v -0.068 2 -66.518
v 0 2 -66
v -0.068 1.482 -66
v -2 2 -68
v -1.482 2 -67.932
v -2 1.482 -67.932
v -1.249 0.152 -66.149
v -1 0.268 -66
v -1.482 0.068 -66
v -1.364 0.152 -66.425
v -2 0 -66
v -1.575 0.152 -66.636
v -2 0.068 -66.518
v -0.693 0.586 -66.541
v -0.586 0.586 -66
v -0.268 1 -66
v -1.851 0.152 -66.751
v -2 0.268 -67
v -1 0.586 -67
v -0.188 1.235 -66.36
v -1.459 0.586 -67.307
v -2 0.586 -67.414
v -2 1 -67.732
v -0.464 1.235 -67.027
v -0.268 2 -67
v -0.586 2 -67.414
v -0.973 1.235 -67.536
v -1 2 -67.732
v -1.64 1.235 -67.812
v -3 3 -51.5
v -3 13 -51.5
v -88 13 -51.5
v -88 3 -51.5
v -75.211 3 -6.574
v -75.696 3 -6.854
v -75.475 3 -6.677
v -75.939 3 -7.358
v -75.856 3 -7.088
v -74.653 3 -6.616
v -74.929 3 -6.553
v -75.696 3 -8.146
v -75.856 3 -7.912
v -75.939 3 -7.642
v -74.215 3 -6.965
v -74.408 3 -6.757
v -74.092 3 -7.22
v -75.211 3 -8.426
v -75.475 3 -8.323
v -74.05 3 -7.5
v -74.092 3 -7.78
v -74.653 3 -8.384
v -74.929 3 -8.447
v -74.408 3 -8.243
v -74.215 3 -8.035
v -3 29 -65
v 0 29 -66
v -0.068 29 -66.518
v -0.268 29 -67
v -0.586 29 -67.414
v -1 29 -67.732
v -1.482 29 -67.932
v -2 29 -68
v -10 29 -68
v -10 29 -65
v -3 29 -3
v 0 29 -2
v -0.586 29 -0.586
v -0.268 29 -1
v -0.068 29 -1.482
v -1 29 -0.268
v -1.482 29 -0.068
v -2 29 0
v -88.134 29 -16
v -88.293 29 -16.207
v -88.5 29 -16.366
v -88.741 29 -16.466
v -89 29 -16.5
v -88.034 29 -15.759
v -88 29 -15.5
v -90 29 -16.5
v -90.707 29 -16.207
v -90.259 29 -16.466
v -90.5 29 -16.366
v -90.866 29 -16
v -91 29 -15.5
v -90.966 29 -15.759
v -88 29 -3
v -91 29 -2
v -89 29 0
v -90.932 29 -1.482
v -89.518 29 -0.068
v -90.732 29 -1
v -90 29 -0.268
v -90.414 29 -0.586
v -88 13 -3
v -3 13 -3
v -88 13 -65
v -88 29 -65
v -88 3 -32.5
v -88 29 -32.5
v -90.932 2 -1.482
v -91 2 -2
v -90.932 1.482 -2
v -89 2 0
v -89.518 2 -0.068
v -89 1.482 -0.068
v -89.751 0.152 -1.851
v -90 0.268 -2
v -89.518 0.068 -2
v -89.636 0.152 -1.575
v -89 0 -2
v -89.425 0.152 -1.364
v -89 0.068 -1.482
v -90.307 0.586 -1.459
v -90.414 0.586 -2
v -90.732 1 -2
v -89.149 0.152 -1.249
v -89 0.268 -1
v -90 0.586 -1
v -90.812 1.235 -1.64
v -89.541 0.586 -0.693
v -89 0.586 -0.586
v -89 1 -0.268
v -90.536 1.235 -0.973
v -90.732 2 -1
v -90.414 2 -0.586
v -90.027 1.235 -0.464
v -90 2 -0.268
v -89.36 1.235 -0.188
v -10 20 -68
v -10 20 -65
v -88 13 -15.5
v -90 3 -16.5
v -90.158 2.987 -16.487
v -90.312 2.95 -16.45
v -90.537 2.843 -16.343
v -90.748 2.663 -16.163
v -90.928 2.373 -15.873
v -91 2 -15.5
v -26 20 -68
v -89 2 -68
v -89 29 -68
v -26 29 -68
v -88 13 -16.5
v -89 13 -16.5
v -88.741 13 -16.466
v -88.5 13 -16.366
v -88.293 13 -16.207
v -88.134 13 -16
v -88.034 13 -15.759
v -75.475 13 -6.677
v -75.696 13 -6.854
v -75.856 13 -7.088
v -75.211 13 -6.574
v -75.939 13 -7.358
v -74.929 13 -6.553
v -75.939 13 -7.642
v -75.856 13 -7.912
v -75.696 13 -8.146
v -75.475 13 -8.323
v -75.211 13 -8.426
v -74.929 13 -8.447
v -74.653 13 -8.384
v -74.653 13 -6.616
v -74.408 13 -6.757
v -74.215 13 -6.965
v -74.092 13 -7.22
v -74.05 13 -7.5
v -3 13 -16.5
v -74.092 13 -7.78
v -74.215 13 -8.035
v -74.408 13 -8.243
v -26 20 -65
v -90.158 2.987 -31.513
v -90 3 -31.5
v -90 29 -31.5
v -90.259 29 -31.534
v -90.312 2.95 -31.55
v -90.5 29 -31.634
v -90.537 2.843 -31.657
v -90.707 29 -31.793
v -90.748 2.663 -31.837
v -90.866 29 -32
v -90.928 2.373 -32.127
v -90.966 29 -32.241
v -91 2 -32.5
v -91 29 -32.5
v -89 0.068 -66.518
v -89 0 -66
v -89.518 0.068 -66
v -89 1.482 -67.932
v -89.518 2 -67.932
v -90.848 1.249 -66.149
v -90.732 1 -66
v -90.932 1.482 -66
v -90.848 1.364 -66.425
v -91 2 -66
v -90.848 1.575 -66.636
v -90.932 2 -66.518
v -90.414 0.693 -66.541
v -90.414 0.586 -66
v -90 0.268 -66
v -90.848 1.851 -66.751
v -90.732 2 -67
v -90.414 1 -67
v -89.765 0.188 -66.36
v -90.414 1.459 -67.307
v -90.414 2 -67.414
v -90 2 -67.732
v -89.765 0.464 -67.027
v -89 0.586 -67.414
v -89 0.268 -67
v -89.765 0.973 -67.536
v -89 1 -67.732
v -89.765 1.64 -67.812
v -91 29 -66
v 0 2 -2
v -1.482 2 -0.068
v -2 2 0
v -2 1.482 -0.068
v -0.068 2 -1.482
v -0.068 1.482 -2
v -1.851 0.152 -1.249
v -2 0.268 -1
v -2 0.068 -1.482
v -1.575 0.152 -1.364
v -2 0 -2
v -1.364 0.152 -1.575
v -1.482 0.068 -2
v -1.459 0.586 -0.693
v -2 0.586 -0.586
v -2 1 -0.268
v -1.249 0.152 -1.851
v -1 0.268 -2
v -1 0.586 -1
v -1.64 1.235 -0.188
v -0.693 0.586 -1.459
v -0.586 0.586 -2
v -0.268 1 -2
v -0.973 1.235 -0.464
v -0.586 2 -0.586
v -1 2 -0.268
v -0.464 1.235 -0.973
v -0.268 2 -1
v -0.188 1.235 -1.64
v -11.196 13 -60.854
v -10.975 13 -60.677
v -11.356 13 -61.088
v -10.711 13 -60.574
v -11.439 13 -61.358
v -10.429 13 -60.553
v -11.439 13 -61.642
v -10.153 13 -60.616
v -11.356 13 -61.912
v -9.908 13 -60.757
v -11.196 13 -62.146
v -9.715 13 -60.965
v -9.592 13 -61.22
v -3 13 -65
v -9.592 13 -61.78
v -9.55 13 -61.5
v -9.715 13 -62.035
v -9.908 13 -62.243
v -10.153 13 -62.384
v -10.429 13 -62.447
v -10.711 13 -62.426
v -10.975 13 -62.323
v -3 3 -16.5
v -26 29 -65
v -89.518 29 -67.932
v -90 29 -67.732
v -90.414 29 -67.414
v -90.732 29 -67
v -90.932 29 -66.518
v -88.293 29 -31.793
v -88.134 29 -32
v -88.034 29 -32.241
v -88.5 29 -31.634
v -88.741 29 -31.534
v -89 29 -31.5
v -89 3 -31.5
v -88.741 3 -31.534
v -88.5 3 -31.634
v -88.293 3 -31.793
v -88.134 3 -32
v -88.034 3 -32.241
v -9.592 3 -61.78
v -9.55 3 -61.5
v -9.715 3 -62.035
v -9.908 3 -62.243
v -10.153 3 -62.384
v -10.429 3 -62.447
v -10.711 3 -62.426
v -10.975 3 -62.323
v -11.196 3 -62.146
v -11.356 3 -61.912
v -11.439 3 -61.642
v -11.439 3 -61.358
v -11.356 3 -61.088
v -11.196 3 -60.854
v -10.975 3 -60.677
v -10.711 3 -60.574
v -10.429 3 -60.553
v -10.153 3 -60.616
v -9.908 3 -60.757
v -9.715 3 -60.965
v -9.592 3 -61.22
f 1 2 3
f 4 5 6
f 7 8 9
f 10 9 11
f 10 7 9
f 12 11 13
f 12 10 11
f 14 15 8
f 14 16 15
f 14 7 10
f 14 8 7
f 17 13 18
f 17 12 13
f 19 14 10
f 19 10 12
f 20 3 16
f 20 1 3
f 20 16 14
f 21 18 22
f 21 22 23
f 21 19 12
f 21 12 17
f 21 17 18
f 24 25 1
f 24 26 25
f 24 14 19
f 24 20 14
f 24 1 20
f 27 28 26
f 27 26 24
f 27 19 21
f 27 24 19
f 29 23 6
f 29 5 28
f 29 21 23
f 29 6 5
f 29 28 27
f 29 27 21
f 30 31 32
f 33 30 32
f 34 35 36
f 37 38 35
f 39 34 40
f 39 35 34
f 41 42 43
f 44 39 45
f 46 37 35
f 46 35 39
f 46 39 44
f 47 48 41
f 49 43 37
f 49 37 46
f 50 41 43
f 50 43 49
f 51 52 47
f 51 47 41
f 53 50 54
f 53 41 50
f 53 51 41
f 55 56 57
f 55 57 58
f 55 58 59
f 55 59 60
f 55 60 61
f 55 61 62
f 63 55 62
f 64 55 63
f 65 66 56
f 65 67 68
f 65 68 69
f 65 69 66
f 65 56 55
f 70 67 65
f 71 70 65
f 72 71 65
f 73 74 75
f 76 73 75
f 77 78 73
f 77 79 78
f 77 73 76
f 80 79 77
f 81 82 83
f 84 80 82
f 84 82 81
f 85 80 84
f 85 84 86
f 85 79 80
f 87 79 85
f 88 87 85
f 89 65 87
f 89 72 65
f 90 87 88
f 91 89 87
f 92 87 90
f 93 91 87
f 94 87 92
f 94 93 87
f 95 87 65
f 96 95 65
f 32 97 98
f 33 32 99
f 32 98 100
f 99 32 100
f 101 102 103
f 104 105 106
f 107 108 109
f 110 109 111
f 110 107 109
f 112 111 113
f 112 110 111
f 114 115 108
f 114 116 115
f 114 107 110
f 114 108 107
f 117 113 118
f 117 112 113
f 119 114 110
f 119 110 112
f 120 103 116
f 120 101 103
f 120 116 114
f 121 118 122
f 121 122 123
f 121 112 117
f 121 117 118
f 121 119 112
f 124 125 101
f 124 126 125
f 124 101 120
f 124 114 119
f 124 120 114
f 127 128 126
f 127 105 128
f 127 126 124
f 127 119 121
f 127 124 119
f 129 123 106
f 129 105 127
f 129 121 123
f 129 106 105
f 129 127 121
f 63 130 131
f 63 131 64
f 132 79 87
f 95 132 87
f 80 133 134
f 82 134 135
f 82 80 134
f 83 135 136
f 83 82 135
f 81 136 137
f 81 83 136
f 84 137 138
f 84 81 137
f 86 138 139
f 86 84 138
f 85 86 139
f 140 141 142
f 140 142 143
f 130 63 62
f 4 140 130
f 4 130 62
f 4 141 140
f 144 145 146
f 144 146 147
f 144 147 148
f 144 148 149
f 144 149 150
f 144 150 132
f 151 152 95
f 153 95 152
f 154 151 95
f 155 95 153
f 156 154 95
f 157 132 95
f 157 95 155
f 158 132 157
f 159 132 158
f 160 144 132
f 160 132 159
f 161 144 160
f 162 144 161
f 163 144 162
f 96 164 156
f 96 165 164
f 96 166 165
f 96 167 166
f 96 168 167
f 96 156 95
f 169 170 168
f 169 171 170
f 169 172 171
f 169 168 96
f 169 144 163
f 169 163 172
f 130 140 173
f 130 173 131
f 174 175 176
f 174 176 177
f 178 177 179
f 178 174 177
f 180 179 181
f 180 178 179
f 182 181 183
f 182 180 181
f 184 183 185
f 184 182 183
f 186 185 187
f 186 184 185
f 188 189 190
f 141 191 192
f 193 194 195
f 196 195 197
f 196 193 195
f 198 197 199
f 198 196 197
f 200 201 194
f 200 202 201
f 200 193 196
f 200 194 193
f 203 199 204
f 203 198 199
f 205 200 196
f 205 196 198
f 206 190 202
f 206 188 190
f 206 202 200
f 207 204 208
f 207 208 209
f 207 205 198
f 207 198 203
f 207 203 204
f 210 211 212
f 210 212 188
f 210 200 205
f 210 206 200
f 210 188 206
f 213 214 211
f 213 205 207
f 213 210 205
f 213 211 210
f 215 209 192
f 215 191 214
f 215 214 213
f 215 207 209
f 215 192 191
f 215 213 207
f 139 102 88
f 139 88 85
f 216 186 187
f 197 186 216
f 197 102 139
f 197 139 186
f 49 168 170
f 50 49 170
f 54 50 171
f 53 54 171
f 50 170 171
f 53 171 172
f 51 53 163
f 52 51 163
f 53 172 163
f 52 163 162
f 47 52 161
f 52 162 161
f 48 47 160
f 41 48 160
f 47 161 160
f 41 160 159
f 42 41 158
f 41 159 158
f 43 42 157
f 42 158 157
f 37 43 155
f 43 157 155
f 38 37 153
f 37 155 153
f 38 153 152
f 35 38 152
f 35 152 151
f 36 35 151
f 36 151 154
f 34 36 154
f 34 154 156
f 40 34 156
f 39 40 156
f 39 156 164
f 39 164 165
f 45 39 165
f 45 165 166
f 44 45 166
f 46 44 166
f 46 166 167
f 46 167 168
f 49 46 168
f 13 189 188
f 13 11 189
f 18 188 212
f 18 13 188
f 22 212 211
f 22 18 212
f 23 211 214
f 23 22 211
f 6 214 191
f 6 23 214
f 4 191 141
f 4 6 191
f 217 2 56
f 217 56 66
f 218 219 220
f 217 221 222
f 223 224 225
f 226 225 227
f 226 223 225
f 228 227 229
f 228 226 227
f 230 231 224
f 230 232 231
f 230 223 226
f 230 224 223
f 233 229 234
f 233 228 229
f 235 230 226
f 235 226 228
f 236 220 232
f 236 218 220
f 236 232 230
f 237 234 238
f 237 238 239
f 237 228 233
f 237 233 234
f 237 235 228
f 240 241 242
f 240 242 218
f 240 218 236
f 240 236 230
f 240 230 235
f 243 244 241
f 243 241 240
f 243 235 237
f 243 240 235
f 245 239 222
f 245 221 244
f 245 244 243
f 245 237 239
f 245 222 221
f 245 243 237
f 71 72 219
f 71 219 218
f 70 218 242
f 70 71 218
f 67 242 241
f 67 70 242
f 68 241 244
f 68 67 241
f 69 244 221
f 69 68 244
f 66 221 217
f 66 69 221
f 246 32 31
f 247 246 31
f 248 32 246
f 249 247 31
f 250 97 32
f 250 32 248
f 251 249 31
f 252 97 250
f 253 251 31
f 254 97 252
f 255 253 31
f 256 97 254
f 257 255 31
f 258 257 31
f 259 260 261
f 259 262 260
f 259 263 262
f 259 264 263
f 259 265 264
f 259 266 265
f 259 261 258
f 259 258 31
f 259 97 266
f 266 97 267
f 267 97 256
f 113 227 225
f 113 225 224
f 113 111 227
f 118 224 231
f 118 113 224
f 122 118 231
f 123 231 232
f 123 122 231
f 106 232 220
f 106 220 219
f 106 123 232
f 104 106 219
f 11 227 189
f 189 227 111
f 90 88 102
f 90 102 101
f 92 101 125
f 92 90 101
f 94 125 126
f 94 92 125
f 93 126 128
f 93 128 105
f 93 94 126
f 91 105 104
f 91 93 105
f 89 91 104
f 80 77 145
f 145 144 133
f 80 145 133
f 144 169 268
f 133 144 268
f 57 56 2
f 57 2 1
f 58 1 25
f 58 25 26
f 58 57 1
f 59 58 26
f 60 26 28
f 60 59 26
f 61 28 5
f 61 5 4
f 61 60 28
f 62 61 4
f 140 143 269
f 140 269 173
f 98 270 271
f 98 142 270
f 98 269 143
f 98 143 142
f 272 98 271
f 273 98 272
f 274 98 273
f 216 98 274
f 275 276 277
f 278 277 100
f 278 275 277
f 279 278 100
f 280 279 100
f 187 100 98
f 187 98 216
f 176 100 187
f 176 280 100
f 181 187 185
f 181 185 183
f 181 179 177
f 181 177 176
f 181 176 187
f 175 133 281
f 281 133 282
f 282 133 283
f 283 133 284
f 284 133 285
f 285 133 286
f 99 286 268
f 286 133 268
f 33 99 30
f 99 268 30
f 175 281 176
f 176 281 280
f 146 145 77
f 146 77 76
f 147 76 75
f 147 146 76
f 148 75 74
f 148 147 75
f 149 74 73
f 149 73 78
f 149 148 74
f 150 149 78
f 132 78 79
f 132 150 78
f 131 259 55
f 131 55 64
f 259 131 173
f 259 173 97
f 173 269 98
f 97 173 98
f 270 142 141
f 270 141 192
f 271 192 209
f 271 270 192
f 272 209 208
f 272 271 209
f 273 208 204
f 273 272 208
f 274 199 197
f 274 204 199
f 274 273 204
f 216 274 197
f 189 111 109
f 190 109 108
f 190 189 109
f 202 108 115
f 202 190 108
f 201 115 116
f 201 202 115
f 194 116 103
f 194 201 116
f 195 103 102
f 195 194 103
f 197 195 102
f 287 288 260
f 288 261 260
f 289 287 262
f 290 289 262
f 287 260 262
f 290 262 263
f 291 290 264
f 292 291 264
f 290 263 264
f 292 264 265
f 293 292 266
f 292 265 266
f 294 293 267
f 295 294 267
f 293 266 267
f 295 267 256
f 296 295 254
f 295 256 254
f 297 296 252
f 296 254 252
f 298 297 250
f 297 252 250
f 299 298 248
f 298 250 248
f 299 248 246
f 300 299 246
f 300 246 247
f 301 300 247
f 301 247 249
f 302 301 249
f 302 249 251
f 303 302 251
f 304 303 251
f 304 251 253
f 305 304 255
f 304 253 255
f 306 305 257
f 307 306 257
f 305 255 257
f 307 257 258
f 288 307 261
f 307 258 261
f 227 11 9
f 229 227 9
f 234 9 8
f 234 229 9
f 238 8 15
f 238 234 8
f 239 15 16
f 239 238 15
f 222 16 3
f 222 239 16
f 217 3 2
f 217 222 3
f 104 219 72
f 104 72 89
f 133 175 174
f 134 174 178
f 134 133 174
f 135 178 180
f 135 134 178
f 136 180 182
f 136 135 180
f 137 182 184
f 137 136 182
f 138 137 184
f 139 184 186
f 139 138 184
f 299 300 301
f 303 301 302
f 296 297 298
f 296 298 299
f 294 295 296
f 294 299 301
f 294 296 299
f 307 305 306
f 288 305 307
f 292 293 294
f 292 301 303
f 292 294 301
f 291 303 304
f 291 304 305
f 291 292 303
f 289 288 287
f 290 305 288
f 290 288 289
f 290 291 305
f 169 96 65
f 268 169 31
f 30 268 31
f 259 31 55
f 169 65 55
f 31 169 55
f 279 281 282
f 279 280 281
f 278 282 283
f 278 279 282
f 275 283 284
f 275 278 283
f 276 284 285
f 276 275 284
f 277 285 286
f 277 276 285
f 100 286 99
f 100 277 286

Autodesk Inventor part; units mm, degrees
ref_plane "YZ Plane" through (0, 0, 0) normal (1, 0, 0) x (0, 1, 0)
ref_plane "XZ Plane" through (0, 0, 0) normal (0, 1, 0) x (-1, 0, 0)
ref_plane "XY Plane" through (0, 0, 0) normal (0, 0, 1) x (1, 0, 0)
sketch "Sketch1" plane through (0, 0, 0) normal (0, 1, 0) x (-1, 0, 0)
  line L0 (0, 0) -> (91, 0)
  line L1 (91, 0) -> (91, -68)
  line L2 (91, -68) -> (0, -68)
  line L3 (0, -68) -> (0, 0)
  line L4 (88, -3) -> (3, -3)
  line L5 (3, -3) -> (3, -65)
  line L6 (3, -65) -> (88, -65)
  line L7 (88, -65) -> (88, -3)
  dimension "d0" = 91
  dimension "d1" = 68
  dimension "d2" = 62
  dimension "d3" = 85
  dimension "d4" = 3
  dimension "d5" = 3
extrude "Extrusion1" add sketch "Sketch1" along normal blind 29 contours L0 L1 L2 L3 | L7 L6 L5 L4
sketch "Sketch2" plane through (0, 29, 0) normal (0, 1, 0) x (1, 0, 0)
  line L0 (-88, 16.5) -> (-3, 16.5)
  line L1 (-3, 16.5) -> (-3, 51.5)
  line L2 (-3, 51.5) -> (-88, 51.5)
  line L3 (-88, 51.5) -> (-88, 16.5)
  line L4 (-91, 68) -> (-91, 0) projected
  line L5 (0, 68) -> (-91, 68) projected
  point P0 (0, 0)
  dimension "d8" = 85
  dimension "d9" = 35
  dimension "d10" = 3
  dimension "d11" = 16.5
extrude "Extrusion2" cut sketch "Sketch2" against normal blind 26
sketch "Sketch3" plane through (0, 29, 0) normal (0, 1, 0) x (1, 0, 0)
  line L0 (-88, 3) -> (-3, 3)
  line L1 (-3, 3) -> (-3, 65)
  line L2 (-3, 65) -> (-88, 65)
  line L3 (-88, 65) -> (-88, 3)
  line L4 (-91, 68) -> (-91, 0) projected
  line L5 (0, 68) -> (-91, 68) projected
  point P0 (0, 0)
  point P1 (-45.5, 68)
  dimension "d14" = 62
  dimension "d15" = 85
  dimension "d16" = 3
  dimension "d17" = 3
extrude "Extrusion3" cut sketch "Sketch3" against normal blind 16
sketch "Sketch4" plane through (0, 0, -68) normal (0, 0, -1) x (-1, 0, 0)
  line L0 (88, 29) -> (3, 29) projected
  line L1 (10, 29) -> (26, 29)
  line L2 (26, 29) -> (26, 20)
  line L3 (26, 20) -> (10, 20)
  line L4 (10, 20) -> (10, 29)
  line L5 (0, 0) -> (0, 29) projected
  point P0 (26, 29)
  dimension "d20" = 16
  dimension "d21" = 9
  dimension "d22" = 10
extrude "Extrusion4" cut sketch "Sketch4" against normal blind 4
sketch "Sketch5" plane through (0, 13, 0) normal (0, 1, 0) x (1, 0, 0)
  circle A0 centre (-75, 7.5) radius 0.95
  line L0 (-88, 3) -> (-88, 65) projected
  line L1 (-3, 3) -> (-88, 3) projected
  circle A1 centre (-10.5, 61.5) radius 0.95
  line L2 (-88, 65) -> (-26, 65) projected
  line L3 (-3, 65) -> (-3, 3) projected
  point P0 (0, 0)
  dimension "d25" = 1.9
  dimension "d26" = 13
  dimension "d27" = 4.5
  dimension "d28" = 1.9
  dimension "d29" = 3.5
  dimension "d30" = 7.5
extrude "Extrusion5" cut sketch "Sketch5" against normal blind 10
fillet "Fillet1" radius 2 8 edges at (0, 14.5, -68) (0, 14.5, 0) (0, 0, -34) (-45.5, 0, -68) (-91, 14.5, -68) (-91, 14.5, 0) (-91, 0, -34) (-45.5, 0, 0)
sketch "Sketch6" plane through (-88, 3, -16.5) normal (1, 0, 0) x (0, 0, -1)
  line L0 (0, 0) -> (15, 0)
  line L1 (15, 0) -> (15, 27)
  line L2 (15, 27) -> (0, 27)
  line L3 (0, 27) -> (0, 0)
  point P0 (-16.5, -3)
  dimension "d34" = 15
  dimension "d35" = 27
extrude "Extrusion6" cut sketch "Sketch6" against normal blind 10
fillet "Fillet2" radius 1 5 edges at (-88, 16, -31.5) (-91, 16, -31.5) (-91, 16, -16.5) (-88, 21, -16.5) (-91, 3, -24)
properties part number "Glove Case"
